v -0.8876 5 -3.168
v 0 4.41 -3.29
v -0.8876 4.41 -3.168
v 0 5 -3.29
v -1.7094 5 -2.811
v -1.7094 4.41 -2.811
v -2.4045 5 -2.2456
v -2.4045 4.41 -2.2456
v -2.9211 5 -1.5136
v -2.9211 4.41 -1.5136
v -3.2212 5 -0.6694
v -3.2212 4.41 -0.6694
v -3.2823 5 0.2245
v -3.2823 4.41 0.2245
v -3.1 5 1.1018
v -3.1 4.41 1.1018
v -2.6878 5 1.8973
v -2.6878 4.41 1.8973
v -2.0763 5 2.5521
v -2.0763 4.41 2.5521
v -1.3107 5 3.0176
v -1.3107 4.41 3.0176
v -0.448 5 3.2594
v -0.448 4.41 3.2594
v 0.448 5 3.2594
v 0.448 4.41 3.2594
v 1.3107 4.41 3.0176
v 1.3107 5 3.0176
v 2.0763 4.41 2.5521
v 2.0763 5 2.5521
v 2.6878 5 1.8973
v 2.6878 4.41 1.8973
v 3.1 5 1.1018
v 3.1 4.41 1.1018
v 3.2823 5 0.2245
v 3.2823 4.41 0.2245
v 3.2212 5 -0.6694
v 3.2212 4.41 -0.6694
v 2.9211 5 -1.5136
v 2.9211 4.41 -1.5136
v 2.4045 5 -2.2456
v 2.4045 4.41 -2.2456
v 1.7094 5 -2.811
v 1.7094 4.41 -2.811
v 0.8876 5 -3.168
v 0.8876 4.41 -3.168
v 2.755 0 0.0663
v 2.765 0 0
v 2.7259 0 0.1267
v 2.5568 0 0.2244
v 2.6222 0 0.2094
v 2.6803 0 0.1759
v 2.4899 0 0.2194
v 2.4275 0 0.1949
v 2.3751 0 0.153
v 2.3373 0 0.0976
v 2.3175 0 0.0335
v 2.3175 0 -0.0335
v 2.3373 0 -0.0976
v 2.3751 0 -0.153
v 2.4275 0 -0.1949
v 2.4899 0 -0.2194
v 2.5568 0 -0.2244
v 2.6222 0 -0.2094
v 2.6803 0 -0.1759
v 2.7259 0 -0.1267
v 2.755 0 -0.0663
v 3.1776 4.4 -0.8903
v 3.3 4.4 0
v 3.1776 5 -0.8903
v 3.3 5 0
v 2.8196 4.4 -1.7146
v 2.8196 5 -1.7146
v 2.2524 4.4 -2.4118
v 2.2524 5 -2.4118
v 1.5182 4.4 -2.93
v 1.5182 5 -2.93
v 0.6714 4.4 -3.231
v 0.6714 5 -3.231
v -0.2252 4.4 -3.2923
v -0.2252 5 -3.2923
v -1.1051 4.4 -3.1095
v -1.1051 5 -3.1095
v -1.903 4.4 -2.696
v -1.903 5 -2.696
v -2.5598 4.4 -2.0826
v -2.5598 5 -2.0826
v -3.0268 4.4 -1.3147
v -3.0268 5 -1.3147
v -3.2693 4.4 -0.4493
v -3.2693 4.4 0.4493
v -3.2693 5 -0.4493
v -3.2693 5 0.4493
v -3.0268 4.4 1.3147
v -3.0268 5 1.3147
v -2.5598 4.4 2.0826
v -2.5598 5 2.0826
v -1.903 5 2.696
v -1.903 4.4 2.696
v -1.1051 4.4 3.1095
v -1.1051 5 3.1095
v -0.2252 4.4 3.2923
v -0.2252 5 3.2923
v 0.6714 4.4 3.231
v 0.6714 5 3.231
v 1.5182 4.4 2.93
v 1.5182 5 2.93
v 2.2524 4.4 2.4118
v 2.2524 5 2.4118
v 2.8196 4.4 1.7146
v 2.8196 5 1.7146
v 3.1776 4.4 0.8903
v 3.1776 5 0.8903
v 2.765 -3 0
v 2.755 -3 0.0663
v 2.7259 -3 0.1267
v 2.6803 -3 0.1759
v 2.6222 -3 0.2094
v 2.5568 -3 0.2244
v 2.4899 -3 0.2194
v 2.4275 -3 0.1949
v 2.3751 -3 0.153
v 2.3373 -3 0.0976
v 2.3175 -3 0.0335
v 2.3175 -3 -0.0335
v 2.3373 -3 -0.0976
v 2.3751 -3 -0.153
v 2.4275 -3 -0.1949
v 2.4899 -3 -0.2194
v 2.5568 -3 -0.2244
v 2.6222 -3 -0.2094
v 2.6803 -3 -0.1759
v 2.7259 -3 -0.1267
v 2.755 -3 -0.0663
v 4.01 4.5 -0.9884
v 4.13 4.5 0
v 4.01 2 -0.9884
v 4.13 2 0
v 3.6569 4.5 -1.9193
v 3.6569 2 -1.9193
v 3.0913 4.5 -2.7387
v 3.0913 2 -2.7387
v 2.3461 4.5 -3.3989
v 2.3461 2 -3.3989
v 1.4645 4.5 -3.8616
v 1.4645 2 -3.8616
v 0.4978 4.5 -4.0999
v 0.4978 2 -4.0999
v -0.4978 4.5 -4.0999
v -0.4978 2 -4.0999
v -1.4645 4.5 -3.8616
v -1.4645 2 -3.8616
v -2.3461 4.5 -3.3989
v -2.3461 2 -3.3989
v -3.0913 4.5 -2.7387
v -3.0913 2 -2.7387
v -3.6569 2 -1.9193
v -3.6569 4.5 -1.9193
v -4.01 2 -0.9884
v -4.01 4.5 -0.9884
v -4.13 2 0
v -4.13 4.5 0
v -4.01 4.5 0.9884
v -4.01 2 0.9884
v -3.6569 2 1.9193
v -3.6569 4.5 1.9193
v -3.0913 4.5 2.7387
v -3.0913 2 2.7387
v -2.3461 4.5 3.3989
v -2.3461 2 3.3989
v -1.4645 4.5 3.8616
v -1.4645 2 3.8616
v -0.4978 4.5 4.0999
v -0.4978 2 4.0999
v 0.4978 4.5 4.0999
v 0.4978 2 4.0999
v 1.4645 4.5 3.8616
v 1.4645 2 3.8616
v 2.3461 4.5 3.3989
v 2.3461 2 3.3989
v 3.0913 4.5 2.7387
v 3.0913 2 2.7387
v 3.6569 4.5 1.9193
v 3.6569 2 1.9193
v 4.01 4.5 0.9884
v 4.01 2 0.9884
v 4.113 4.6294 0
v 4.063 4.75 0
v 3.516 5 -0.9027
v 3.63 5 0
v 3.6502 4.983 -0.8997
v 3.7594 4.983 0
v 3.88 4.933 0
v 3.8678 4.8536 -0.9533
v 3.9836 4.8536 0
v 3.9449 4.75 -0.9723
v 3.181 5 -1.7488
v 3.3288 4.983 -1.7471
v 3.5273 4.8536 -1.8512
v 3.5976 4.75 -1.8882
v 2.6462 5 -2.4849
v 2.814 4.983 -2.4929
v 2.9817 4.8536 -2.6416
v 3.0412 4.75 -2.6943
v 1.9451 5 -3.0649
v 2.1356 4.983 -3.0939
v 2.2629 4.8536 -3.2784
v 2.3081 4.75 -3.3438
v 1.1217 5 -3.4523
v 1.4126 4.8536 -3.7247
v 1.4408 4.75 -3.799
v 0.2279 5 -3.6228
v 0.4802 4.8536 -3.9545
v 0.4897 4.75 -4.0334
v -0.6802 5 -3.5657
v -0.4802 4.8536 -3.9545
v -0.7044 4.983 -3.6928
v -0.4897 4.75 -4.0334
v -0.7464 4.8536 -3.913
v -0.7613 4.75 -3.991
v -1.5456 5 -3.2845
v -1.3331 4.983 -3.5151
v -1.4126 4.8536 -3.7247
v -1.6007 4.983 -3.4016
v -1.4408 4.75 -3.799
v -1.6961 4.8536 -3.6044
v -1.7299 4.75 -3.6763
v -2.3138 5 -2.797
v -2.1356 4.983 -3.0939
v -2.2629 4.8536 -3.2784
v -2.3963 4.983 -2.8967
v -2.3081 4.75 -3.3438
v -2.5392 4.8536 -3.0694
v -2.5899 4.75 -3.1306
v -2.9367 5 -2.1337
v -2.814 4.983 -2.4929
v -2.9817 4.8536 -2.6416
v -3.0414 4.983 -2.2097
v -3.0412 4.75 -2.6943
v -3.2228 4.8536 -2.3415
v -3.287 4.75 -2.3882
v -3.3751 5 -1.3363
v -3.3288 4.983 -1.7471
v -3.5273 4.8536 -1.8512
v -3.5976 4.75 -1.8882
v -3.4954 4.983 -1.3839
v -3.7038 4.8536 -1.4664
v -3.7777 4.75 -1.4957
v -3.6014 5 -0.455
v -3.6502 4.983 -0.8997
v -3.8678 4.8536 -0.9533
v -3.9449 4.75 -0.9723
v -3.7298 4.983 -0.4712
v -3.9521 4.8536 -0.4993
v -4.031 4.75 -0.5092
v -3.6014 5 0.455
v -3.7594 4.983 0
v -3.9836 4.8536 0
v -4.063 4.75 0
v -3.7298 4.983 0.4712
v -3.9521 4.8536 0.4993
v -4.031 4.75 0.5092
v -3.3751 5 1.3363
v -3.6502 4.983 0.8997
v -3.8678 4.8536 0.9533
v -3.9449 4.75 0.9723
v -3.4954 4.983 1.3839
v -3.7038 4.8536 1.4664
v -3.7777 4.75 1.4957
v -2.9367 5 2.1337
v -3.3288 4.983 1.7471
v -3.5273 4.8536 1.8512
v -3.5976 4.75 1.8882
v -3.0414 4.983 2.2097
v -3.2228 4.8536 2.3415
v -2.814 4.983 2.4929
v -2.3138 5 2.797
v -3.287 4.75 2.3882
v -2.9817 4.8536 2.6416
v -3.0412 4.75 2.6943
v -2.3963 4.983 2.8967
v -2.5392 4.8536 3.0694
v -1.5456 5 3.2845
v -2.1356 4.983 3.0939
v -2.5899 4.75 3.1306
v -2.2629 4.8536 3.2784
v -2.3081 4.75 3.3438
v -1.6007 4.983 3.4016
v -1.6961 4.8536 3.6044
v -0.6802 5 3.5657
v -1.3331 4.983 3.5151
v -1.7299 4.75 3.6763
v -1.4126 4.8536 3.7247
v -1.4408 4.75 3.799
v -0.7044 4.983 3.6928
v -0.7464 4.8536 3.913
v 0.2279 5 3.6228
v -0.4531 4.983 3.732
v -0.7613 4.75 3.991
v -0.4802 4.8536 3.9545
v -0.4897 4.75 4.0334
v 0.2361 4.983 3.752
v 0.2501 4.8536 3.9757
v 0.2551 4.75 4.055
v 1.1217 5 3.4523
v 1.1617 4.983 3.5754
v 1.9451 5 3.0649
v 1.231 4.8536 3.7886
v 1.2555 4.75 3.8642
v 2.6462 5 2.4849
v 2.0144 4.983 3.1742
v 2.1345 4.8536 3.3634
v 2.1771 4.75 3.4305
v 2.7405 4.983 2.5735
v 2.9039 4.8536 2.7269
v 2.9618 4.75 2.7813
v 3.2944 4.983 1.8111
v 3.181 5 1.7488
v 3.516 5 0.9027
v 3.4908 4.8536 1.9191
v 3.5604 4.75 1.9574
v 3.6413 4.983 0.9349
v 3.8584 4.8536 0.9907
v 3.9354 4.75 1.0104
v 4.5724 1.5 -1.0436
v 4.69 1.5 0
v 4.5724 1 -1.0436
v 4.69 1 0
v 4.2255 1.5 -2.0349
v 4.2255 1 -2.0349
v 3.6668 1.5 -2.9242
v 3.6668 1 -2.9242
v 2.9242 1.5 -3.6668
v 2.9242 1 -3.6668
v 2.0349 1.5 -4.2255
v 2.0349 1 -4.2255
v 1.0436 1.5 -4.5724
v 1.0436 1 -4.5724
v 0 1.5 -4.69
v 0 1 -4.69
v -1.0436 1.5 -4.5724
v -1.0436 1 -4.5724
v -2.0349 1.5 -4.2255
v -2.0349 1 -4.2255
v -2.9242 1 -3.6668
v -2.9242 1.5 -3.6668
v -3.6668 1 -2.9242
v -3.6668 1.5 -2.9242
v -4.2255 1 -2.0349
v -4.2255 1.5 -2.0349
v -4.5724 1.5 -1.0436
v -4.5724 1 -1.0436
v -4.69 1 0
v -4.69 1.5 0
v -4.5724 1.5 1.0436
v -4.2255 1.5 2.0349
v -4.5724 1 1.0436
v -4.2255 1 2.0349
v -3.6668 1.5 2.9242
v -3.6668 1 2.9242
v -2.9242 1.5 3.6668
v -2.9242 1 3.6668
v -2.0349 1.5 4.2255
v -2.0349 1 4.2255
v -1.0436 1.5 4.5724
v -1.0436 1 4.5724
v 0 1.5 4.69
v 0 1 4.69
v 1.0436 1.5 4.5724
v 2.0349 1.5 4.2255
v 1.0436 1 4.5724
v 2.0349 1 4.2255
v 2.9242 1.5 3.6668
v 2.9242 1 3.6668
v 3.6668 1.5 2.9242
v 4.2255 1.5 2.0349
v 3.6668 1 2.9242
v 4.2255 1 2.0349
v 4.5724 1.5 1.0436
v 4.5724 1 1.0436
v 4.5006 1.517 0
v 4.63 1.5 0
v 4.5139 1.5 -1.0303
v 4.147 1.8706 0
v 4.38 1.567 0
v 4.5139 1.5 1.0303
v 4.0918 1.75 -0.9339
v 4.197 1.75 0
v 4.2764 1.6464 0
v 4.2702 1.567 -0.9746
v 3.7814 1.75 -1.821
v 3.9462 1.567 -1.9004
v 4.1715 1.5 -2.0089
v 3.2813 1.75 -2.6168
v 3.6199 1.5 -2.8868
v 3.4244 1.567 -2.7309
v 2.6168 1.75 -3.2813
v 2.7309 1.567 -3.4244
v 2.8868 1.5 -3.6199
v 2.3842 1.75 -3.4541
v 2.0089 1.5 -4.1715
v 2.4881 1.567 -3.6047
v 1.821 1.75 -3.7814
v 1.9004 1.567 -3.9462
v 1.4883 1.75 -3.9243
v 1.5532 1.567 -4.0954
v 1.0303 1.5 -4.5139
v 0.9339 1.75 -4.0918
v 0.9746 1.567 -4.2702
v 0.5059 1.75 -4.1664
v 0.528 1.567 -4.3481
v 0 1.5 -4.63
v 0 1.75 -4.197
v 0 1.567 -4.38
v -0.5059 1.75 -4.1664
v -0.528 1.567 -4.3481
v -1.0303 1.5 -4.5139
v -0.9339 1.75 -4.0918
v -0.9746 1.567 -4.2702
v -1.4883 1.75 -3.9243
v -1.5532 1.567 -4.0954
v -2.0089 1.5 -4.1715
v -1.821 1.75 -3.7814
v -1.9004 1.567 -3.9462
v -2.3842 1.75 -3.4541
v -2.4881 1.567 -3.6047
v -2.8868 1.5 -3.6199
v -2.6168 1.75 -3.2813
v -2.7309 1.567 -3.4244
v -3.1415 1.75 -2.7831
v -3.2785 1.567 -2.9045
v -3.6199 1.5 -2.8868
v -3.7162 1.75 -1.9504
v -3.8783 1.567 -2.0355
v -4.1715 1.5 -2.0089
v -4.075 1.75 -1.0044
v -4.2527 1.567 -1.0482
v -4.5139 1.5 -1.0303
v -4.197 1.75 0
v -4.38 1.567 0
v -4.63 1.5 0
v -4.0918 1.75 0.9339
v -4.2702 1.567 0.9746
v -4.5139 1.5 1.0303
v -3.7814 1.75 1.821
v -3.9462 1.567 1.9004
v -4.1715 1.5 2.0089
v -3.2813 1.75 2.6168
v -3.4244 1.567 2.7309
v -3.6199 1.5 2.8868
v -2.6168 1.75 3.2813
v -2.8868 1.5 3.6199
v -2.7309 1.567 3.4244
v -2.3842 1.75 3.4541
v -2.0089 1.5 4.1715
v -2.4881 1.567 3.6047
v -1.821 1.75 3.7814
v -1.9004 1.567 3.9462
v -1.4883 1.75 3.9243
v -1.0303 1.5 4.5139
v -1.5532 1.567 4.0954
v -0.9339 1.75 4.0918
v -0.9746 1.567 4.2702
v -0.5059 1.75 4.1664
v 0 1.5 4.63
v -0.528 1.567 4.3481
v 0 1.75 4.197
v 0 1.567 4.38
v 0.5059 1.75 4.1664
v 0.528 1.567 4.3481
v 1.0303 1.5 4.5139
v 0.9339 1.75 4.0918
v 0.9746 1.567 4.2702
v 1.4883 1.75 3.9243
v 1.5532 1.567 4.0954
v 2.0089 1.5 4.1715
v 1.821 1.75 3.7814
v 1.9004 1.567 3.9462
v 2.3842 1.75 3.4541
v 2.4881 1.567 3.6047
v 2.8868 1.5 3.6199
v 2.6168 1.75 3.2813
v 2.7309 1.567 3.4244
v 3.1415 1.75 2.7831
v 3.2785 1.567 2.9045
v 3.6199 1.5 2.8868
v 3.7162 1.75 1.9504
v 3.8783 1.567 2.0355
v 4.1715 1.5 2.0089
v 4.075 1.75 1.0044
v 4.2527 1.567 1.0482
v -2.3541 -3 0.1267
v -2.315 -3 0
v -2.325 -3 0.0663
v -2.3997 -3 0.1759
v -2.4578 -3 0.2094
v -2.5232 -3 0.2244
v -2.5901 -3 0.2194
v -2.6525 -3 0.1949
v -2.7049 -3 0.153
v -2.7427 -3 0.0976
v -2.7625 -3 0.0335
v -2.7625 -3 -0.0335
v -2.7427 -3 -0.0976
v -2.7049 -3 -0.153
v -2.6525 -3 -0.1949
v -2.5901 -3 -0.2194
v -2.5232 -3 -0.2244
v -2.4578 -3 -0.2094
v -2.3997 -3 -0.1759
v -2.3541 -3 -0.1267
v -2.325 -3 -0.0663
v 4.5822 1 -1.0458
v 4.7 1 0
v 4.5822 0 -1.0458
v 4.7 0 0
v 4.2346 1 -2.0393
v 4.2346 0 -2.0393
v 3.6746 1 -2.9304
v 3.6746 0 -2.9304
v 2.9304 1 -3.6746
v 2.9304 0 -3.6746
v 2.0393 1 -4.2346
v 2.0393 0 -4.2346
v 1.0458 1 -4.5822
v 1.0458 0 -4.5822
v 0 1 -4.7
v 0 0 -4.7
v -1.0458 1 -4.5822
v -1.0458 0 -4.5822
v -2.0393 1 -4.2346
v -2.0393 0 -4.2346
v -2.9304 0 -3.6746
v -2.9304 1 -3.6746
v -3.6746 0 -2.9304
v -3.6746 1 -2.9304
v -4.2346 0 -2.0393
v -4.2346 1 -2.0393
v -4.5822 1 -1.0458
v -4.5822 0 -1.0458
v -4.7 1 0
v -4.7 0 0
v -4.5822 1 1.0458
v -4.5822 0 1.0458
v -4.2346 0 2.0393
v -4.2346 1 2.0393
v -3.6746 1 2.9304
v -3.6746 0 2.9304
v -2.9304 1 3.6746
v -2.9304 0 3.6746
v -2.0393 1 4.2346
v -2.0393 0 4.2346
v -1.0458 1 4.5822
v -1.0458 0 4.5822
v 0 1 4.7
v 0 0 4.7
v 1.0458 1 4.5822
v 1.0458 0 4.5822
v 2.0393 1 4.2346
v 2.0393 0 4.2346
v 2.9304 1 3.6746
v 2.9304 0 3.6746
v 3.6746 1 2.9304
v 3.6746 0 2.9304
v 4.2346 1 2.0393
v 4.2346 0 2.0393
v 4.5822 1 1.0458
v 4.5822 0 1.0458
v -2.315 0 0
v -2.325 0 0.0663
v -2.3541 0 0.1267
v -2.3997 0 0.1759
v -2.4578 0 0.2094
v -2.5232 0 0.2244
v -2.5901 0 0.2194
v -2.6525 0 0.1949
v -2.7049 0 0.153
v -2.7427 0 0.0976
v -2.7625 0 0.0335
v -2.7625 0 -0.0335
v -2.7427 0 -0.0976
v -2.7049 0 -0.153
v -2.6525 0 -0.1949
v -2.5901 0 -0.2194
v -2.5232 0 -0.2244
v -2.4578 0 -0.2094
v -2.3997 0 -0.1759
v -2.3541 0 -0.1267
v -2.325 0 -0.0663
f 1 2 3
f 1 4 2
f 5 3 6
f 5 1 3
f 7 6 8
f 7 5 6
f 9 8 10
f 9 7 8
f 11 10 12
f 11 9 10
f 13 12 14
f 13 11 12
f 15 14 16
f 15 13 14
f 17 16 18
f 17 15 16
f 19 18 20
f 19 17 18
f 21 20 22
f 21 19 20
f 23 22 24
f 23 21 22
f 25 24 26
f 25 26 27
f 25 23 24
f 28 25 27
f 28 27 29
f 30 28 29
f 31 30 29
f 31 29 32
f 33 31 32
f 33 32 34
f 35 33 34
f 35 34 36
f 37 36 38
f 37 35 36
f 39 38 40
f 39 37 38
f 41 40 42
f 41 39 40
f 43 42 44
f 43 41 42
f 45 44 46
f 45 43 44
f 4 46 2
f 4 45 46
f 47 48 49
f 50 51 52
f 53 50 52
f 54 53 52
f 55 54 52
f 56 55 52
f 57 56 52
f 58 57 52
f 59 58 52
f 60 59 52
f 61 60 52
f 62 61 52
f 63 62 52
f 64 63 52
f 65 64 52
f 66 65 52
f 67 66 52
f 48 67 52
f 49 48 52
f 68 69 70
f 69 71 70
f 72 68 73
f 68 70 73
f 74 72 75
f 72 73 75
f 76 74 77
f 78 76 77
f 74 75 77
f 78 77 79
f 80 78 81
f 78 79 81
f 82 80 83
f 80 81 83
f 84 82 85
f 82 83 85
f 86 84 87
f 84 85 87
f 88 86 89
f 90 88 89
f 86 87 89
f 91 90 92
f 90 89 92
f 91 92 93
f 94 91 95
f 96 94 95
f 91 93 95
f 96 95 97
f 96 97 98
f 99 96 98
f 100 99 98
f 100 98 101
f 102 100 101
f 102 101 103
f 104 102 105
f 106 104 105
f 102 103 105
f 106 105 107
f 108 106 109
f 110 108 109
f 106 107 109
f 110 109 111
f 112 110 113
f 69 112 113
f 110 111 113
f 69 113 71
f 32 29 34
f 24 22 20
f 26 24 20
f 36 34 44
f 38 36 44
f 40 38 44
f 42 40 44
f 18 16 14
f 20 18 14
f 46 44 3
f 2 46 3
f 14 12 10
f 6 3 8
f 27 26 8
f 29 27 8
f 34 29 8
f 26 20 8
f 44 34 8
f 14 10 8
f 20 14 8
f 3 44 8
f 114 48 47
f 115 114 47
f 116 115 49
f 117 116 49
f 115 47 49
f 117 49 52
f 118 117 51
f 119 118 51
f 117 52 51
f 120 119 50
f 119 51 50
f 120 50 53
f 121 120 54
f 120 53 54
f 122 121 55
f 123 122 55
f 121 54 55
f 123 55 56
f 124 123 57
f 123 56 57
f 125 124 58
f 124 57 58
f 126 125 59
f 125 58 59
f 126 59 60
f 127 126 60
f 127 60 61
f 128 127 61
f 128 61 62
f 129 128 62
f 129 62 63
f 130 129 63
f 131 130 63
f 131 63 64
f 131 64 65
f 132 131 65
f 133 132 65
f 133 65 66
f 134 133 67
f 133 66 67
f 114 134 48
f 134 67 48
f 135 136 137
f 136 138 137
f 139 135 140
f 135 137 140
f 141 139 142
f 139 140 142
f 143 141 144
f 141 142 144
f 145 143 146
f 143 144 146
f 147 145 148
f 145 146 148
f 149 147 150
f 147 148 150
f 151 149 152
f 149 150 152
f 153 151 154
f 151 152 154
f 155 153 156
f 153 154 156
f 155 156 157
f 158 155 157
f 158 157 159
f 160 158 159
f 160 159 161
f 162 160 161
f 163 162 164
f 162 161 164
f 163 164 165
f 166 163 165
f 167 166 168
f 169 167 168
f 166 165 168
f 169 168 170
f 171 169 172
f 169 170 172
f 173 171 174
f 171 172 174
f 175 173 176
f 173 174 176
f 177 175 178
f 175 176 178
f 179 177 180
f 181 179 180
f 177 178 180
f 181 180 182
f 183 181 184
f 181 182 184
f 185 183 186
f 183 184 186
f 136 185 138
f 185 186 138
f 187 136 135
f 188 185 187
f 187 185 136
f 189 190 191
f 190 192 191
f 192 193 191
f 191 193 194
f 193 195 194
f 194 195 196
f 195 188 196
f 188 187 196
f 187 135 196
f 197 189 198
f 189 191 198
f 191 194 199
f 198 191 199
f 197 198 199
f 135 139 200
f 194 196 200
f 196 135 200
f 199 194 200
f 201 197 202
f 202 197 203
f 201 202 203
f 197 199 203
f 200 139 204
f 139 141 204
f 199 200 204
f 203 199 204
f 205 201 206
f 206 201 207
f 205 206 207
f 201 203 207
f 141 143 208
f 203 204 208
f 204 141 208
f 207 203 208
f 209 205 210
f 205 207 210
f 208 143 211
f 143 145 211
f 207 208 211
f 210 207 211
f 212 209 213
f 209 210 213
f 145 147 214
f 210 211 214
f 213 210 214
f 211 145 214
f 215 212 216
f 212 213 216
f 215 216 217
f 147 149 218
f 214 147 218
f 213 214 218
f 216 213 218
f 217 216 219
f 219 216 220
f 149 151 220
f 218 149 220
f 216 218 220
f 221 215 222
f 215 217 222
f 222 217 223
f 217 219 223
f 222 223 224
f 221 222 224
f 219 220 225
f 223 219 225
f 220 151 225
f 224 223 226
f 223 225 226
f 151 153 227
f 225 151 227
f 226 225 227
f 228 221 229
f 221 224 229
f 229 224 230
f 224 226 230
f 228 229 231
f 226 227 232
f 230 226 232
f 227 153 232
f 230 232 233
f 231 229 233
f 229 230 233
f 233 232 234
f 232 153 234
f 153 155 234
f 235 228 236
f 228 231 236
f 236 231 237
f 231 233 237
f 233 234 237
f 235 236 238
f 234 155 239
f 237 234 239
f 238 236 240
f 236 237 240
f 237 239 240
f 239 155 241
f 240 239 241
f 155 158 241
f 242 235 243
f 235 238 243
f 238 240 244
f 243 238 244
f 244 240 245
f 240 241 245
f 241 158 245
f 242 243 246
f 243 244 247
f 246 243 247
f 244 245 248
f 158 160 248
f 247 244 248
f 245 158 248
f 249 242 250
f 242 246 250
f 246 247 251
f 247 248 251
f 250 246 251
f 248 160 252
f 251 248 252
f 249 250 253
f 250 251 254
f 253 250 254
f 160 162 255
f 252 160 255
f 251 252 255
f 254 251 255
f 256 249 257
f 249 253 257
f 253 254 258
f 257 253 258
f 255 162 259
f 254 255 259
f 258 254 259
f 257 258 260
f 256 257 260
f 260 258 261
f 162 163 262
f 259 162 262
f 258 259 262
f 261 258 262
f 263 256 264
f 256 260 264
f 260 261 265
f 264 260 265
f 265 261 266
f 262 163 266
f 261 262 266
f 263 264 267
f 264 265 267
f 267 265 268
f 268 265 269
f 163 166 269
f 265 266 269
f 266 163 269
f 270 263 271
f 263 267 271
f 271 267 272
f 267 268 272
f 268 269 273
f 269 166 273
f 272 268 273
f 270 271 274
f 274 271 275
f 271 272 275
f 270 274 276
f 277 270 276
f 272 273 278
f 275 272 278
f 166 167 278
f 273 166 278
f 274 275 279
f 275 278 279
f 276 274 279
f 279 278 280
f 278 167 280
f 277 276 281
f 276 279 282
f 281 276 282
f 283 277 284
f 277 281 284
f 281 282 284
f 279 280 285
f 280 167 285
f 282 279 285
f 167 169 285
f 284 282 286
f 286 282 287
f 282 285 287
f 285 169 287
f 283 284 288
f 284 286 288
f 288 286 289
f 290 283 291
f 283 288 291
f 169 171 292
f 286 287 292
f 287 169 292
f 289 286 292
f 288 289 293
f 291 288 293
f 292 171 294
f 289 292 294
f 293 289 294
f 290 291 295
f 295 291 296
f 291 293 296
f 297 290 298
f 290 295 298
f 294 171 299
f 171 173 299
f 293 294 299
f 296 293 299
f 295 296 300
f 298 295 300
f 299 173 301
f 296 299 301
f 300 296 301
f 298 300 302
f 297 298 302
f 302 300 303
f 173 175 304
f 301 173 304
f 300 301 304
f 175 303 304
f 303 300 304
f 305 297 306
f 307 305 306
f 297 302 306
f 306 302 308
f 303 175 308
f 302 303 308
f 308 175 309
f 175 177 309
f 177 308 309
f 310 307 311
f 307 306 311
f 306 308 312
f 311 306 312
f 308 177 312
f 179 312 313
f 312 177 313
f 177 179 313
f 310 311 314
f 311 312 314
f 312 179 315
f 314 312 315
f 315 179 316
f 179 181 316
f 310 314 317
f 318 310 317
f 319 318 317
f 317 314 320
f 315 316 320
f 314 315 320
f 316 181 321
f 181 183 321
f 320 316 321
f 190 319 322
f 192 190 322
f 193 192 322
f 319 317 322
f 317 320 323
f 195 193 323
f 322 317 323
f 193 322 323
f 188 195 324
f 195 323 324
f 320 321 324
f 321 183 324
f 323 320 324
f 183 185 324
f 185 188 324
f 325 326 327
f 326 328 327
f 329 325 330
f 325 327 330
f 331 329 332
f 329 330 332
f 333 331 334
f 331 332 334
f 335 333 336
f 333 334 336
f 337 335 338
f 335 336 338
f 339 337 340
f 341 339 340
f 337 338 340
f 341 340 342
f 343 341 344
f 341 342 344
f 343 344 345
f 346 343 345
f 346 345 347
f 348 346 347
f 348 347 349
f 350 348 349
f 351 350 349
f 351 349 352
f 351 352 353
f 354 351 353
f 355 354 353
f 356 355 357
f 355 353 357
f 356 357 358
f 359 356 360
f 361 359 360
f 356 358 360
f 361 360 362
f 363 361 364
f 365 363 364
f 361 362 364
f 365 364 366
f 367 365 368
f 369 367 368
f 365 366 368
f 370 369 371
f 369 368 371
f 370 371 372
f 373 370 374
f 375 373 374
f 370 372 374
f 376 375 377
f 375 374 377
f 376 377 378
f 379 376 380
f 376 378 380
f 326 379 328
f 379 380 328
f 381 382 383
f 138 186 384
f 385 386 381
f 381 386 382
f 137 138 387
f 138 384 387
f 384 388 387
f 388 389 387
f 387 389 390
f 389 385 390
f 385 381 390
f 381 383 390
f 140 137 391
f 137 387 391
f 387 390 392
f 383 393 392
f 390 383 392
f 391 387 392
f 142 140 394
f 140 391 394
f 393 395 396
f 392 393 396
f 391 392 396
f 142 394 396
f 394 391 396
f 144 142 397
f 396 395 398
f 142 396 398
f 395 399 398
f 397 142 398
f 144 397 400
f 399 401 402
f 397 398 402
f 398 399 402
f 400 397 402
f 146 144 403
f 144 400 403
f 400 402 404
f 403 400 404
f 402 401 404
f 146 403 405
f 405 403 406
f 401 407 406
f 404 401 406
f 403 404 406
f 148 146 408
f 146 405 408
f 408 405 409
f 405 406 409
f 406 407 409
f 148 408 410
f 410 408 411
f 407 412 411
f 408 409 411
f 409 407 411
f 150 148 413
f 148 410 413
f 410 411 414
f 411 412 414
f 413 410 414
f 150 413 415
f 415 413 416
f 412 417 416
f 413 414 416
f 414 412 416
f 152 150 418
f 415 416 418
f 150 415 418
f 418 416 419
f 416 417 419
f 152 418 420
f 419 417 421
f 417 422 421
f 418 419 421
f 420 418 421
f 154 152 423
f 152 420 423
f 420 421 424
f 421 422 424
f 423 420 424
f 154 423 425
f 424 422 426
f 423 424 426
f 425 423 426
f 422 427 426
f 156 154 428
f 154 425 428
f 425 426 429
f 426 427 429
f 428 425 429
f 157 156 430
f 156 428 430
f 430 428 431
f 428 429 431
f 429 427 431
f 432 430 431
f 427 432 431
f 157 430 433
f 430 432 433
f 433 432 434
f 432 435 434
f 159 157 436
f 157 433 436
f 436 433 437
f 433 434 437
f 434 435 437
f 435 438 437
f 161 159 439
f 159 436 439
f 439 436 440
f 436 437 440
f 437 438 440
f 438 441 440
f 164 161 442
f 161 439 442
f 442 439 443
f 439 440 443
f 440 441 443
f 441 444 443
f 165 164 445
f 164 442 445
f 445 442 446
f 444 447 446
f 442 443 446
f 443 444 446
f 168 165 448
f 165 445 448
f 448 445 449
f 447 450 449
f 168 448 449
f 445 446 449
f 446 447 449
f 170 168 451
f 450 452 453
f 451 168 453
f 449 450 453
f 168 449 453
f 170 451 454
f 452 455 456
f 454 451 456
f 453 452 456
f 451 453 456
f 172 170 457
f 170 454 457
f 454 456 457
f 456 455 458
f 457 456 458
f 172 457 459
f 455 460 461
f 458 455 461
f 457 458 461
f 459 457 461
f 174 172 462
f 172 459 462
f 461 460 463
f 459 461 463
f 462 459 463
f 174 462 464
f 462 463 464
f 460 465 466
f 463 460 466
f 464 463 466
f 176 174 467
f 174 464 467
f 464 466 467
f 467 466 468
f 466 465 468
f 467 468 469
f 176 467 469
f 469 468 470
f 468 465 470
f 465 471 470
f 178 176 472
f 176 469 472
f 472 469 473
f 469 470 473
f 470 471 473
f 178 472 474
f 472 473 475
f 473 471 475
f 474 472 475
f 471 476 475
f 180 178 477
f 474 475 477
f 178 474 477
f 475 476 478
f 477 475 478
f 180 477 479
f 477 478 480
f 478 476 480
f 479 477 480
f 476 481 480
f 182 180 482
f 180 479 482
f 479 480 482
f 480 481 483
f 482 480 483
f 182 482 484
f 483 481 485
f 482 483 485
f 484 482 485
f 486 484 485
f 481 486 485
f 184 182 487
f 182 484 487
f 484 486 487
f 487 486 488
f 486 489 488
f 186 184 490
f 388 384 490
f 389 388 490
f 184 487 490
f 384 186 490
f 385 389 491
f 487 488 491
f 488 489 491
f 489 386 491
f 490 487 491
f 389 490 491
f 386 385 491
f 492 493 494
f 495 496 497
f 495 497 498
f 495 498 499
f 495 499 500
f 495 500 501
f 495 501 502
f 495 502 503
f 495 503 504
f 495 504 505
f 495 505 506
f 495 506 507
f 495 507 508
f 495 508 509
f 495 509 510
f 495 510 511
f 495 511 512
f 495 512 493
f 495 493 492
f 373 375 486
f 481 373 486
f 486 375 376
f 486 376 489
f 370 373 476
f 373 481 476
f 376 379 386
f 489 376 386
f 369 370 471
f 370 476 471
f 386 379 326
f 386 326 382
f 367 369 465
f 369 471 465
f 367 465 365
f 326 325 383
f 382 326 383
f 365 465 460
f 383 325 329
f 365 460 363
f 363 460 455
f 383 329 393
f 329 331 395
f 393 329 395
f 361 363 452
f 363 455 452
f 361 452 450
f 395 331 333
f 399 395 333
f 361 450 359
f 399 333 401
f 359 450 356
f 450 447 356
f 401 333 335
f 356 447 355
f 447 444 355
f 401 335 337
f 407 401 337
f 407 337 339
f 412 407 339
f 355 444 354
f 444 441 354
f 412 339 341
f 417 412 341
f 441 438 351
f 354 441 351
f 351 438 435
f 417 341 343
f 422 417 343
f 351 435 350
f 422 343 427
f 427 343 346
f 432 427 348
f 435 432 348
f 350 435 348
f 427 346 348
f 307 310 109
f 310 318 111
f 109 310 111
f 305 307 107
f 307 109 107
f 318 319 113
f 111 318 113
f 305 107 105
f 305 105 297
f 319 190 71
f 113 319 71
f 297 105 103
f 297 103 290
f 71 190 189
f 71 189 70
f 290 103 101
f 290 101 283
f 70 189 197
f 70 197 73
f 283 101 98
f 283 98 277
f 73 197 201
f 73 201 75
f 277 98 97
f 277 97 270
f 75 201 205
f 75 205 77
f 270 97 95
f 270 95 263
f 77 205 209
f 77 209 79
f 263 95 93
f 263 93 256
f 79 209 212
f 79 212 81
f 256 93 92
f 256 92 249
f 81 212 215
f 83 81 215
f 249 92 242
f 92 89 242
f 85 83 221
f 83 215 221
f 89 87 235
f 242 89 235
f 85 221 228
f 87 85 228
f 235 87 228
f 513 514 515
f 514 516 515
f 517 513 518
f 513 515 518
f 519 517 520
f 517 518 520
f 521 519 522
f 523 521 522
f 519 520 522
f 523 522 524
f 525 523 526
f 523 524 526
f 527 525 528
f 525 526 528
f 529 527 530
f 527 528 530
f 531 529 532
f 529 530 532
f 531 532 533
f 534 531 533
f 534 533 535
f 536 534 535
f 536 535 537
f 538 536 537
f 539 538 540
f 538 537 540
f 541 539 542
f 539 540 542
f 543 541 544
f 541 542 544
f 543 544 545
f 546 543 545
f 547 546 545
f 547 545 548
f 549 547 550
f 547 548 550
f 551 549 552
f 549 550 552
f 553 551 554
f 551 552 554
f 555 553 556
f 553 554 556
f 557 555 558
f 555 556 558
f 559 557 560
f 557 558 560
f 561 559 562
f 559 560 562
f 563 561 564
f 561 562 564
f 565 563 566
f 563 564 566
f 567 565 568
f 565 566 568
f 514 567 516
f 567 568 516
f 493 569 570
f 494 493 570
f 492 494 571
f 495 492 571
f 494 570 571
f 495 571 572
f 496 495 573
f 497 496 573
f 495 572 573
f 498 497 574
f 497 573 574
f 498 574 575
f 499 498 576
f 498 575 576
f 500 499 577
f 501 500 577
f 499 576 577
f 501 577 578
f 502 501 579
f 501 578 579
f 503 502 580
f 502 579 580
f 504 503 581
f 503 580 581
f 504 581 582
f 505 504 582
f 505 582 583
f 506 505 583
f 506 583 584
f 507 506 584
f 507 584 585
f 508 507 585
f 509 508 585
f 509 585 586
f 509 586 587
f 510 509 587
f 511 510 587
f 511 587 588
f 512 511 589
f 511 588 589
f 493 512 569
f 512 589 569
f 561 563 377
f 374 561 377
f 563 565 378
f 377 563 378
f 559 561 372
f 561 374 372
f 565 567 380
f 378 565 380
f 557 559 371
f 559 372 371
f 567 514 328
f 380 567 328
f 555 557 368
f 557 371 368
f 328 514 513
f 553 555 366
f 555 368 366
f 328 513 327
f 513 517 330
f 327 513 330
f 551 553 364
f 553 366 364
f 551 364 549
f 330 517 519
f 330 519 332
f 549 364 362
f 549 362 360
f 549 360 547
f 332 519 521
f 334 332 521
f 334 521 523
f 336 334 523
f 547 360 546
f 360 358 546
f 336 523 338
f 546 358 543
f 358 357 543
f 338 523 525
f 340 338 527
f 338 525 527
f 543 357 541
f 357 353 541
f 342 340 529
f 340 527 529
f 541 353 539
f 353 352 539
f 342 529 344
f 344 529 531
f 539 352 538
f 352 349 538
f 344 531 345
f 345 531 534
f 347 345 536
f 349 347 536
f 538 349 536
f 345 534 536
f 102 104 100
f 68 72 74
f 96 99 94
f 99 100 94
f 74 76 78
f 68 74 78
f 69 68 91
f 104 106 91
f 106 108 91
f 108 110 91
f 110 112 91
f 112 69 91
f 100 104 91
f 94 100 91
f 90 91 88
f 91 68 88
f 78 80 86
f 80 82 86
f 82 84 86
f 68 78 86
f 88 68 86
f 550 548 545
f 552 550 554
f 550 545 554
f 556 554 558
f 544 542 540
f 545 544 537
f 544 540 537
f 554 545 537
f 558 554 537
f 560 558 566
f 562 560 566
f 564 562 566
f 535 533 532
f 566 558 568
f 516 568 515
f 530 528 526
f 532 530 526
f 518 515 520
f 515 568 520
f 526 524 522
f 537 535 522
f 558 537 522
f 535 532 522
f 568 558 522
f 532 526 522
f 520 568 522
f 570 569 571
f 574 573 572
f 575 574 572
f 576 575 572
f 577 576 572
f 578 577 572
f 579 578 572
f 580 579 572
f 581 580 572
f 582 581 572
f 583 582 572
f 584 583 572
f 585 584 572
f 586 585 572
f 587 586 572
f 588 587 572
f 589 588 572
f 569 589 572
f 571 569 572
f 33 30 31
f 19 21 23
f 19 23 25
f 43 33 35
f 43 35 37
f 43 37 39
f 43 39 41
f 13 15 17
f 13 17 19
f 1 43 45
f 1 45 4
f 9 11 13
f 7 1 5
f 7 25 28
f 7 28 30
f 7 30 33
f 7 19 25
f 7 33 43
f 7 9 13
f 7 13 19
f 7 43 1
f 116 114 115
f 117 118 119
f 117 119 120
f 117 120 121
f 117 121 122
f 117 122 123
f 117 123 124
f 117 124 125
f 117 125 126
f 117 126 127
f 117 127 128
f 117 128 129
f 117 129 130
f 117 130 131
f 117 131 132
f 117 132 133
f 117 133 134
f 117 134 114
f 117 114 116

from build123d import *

# Parameters (mm, degrees)
SKETCH2_R             = 0.225
BOSS_EXTRUDE1_DEPTH   = 3
BOSS_EXTRUDE1_2_DEPTH = 3
SKETCH3_W             = 3.29
SKETCH3_H             = 0.59


with BuildPart() as part:
    # Sketch1 → Revolve1 (revolve)
    with BuildSketch(Plane.XY, mode=Mode.PRIVATE) as revolve1_sk:
        with BuildLine():
            Line((0, 4.4), (-3.3, 4.4))
            Line((-3.3, 4.4), (-3.3, 5))
            Line((-3.3, 5), (-3.63, 5))
            ThreePointArc((-3.63, 5), (-3.983553391, 4.853553391), (-4.13, 4.5))
            Line((-4.13, 4.5), (-4.13, 2))
            ThreePointArc((-4.13, 2), (-4.276446609, 1.646446609), (-4.63, 1.5))
            Line((-4.63, 1.5), (-4.69, 1.5))
            Line((-4.69, 1.5), (-4.69, 1))
            Line((-4.69, 1), (-4.7, 1))
            Line((-4.7, 1), (-4.7, 0))
            Line((-4.7, 0), (0, 0))
            Line((0, 0), (0, 4.4))
        make_face()
    revolve(revolve1_sk.sketch.rotate(Axis((0, 0, 0), (0, 1, 0)), 180), axis=Axis((0, 0, 0), (0, 1, 0)))


with BuildPart() as body_2:
    # Sketch2 → Boss-Extrude1 (new body)
    with BuildSketch(Plane.XZ):
        with Locations((-2.54, 0)):
            Circle(SKETCH2_R)
    extrude(amount=BOSS_EXTRUDE1_DEPTH)


with BuildPart() as body_3:
    # Sketch2 → Boss-Extrude1 2 (new body)
    with BuildSketch(Plane.XZ):
        with Locations((2.54, 0)):
            Circle(SKETCH2_R)
    extrude(amount=BOSS_EXTRUDE1_2_DEPTH)


with BuildPart() as body_4:
    # Sketch3 → Revolve2 (revolve)
    with BuildSketch(Plane.XY, mode=Mode.PRIVATE) as revolve2_sk:
        with Locations((-1.645, 4.705)):
            Rectangle(SKETCH3_W, SKETCH3_H)
    revolve(revolve2_sk.sketch.rotate(Axis((0, 4.41, 0), (0, 1, 0)), 270), axis=Axis((0, 4.41, 0), (0, 1, 0)))


solid = Compound([part.part, body_2.part, body_3.part, body_4.part])
